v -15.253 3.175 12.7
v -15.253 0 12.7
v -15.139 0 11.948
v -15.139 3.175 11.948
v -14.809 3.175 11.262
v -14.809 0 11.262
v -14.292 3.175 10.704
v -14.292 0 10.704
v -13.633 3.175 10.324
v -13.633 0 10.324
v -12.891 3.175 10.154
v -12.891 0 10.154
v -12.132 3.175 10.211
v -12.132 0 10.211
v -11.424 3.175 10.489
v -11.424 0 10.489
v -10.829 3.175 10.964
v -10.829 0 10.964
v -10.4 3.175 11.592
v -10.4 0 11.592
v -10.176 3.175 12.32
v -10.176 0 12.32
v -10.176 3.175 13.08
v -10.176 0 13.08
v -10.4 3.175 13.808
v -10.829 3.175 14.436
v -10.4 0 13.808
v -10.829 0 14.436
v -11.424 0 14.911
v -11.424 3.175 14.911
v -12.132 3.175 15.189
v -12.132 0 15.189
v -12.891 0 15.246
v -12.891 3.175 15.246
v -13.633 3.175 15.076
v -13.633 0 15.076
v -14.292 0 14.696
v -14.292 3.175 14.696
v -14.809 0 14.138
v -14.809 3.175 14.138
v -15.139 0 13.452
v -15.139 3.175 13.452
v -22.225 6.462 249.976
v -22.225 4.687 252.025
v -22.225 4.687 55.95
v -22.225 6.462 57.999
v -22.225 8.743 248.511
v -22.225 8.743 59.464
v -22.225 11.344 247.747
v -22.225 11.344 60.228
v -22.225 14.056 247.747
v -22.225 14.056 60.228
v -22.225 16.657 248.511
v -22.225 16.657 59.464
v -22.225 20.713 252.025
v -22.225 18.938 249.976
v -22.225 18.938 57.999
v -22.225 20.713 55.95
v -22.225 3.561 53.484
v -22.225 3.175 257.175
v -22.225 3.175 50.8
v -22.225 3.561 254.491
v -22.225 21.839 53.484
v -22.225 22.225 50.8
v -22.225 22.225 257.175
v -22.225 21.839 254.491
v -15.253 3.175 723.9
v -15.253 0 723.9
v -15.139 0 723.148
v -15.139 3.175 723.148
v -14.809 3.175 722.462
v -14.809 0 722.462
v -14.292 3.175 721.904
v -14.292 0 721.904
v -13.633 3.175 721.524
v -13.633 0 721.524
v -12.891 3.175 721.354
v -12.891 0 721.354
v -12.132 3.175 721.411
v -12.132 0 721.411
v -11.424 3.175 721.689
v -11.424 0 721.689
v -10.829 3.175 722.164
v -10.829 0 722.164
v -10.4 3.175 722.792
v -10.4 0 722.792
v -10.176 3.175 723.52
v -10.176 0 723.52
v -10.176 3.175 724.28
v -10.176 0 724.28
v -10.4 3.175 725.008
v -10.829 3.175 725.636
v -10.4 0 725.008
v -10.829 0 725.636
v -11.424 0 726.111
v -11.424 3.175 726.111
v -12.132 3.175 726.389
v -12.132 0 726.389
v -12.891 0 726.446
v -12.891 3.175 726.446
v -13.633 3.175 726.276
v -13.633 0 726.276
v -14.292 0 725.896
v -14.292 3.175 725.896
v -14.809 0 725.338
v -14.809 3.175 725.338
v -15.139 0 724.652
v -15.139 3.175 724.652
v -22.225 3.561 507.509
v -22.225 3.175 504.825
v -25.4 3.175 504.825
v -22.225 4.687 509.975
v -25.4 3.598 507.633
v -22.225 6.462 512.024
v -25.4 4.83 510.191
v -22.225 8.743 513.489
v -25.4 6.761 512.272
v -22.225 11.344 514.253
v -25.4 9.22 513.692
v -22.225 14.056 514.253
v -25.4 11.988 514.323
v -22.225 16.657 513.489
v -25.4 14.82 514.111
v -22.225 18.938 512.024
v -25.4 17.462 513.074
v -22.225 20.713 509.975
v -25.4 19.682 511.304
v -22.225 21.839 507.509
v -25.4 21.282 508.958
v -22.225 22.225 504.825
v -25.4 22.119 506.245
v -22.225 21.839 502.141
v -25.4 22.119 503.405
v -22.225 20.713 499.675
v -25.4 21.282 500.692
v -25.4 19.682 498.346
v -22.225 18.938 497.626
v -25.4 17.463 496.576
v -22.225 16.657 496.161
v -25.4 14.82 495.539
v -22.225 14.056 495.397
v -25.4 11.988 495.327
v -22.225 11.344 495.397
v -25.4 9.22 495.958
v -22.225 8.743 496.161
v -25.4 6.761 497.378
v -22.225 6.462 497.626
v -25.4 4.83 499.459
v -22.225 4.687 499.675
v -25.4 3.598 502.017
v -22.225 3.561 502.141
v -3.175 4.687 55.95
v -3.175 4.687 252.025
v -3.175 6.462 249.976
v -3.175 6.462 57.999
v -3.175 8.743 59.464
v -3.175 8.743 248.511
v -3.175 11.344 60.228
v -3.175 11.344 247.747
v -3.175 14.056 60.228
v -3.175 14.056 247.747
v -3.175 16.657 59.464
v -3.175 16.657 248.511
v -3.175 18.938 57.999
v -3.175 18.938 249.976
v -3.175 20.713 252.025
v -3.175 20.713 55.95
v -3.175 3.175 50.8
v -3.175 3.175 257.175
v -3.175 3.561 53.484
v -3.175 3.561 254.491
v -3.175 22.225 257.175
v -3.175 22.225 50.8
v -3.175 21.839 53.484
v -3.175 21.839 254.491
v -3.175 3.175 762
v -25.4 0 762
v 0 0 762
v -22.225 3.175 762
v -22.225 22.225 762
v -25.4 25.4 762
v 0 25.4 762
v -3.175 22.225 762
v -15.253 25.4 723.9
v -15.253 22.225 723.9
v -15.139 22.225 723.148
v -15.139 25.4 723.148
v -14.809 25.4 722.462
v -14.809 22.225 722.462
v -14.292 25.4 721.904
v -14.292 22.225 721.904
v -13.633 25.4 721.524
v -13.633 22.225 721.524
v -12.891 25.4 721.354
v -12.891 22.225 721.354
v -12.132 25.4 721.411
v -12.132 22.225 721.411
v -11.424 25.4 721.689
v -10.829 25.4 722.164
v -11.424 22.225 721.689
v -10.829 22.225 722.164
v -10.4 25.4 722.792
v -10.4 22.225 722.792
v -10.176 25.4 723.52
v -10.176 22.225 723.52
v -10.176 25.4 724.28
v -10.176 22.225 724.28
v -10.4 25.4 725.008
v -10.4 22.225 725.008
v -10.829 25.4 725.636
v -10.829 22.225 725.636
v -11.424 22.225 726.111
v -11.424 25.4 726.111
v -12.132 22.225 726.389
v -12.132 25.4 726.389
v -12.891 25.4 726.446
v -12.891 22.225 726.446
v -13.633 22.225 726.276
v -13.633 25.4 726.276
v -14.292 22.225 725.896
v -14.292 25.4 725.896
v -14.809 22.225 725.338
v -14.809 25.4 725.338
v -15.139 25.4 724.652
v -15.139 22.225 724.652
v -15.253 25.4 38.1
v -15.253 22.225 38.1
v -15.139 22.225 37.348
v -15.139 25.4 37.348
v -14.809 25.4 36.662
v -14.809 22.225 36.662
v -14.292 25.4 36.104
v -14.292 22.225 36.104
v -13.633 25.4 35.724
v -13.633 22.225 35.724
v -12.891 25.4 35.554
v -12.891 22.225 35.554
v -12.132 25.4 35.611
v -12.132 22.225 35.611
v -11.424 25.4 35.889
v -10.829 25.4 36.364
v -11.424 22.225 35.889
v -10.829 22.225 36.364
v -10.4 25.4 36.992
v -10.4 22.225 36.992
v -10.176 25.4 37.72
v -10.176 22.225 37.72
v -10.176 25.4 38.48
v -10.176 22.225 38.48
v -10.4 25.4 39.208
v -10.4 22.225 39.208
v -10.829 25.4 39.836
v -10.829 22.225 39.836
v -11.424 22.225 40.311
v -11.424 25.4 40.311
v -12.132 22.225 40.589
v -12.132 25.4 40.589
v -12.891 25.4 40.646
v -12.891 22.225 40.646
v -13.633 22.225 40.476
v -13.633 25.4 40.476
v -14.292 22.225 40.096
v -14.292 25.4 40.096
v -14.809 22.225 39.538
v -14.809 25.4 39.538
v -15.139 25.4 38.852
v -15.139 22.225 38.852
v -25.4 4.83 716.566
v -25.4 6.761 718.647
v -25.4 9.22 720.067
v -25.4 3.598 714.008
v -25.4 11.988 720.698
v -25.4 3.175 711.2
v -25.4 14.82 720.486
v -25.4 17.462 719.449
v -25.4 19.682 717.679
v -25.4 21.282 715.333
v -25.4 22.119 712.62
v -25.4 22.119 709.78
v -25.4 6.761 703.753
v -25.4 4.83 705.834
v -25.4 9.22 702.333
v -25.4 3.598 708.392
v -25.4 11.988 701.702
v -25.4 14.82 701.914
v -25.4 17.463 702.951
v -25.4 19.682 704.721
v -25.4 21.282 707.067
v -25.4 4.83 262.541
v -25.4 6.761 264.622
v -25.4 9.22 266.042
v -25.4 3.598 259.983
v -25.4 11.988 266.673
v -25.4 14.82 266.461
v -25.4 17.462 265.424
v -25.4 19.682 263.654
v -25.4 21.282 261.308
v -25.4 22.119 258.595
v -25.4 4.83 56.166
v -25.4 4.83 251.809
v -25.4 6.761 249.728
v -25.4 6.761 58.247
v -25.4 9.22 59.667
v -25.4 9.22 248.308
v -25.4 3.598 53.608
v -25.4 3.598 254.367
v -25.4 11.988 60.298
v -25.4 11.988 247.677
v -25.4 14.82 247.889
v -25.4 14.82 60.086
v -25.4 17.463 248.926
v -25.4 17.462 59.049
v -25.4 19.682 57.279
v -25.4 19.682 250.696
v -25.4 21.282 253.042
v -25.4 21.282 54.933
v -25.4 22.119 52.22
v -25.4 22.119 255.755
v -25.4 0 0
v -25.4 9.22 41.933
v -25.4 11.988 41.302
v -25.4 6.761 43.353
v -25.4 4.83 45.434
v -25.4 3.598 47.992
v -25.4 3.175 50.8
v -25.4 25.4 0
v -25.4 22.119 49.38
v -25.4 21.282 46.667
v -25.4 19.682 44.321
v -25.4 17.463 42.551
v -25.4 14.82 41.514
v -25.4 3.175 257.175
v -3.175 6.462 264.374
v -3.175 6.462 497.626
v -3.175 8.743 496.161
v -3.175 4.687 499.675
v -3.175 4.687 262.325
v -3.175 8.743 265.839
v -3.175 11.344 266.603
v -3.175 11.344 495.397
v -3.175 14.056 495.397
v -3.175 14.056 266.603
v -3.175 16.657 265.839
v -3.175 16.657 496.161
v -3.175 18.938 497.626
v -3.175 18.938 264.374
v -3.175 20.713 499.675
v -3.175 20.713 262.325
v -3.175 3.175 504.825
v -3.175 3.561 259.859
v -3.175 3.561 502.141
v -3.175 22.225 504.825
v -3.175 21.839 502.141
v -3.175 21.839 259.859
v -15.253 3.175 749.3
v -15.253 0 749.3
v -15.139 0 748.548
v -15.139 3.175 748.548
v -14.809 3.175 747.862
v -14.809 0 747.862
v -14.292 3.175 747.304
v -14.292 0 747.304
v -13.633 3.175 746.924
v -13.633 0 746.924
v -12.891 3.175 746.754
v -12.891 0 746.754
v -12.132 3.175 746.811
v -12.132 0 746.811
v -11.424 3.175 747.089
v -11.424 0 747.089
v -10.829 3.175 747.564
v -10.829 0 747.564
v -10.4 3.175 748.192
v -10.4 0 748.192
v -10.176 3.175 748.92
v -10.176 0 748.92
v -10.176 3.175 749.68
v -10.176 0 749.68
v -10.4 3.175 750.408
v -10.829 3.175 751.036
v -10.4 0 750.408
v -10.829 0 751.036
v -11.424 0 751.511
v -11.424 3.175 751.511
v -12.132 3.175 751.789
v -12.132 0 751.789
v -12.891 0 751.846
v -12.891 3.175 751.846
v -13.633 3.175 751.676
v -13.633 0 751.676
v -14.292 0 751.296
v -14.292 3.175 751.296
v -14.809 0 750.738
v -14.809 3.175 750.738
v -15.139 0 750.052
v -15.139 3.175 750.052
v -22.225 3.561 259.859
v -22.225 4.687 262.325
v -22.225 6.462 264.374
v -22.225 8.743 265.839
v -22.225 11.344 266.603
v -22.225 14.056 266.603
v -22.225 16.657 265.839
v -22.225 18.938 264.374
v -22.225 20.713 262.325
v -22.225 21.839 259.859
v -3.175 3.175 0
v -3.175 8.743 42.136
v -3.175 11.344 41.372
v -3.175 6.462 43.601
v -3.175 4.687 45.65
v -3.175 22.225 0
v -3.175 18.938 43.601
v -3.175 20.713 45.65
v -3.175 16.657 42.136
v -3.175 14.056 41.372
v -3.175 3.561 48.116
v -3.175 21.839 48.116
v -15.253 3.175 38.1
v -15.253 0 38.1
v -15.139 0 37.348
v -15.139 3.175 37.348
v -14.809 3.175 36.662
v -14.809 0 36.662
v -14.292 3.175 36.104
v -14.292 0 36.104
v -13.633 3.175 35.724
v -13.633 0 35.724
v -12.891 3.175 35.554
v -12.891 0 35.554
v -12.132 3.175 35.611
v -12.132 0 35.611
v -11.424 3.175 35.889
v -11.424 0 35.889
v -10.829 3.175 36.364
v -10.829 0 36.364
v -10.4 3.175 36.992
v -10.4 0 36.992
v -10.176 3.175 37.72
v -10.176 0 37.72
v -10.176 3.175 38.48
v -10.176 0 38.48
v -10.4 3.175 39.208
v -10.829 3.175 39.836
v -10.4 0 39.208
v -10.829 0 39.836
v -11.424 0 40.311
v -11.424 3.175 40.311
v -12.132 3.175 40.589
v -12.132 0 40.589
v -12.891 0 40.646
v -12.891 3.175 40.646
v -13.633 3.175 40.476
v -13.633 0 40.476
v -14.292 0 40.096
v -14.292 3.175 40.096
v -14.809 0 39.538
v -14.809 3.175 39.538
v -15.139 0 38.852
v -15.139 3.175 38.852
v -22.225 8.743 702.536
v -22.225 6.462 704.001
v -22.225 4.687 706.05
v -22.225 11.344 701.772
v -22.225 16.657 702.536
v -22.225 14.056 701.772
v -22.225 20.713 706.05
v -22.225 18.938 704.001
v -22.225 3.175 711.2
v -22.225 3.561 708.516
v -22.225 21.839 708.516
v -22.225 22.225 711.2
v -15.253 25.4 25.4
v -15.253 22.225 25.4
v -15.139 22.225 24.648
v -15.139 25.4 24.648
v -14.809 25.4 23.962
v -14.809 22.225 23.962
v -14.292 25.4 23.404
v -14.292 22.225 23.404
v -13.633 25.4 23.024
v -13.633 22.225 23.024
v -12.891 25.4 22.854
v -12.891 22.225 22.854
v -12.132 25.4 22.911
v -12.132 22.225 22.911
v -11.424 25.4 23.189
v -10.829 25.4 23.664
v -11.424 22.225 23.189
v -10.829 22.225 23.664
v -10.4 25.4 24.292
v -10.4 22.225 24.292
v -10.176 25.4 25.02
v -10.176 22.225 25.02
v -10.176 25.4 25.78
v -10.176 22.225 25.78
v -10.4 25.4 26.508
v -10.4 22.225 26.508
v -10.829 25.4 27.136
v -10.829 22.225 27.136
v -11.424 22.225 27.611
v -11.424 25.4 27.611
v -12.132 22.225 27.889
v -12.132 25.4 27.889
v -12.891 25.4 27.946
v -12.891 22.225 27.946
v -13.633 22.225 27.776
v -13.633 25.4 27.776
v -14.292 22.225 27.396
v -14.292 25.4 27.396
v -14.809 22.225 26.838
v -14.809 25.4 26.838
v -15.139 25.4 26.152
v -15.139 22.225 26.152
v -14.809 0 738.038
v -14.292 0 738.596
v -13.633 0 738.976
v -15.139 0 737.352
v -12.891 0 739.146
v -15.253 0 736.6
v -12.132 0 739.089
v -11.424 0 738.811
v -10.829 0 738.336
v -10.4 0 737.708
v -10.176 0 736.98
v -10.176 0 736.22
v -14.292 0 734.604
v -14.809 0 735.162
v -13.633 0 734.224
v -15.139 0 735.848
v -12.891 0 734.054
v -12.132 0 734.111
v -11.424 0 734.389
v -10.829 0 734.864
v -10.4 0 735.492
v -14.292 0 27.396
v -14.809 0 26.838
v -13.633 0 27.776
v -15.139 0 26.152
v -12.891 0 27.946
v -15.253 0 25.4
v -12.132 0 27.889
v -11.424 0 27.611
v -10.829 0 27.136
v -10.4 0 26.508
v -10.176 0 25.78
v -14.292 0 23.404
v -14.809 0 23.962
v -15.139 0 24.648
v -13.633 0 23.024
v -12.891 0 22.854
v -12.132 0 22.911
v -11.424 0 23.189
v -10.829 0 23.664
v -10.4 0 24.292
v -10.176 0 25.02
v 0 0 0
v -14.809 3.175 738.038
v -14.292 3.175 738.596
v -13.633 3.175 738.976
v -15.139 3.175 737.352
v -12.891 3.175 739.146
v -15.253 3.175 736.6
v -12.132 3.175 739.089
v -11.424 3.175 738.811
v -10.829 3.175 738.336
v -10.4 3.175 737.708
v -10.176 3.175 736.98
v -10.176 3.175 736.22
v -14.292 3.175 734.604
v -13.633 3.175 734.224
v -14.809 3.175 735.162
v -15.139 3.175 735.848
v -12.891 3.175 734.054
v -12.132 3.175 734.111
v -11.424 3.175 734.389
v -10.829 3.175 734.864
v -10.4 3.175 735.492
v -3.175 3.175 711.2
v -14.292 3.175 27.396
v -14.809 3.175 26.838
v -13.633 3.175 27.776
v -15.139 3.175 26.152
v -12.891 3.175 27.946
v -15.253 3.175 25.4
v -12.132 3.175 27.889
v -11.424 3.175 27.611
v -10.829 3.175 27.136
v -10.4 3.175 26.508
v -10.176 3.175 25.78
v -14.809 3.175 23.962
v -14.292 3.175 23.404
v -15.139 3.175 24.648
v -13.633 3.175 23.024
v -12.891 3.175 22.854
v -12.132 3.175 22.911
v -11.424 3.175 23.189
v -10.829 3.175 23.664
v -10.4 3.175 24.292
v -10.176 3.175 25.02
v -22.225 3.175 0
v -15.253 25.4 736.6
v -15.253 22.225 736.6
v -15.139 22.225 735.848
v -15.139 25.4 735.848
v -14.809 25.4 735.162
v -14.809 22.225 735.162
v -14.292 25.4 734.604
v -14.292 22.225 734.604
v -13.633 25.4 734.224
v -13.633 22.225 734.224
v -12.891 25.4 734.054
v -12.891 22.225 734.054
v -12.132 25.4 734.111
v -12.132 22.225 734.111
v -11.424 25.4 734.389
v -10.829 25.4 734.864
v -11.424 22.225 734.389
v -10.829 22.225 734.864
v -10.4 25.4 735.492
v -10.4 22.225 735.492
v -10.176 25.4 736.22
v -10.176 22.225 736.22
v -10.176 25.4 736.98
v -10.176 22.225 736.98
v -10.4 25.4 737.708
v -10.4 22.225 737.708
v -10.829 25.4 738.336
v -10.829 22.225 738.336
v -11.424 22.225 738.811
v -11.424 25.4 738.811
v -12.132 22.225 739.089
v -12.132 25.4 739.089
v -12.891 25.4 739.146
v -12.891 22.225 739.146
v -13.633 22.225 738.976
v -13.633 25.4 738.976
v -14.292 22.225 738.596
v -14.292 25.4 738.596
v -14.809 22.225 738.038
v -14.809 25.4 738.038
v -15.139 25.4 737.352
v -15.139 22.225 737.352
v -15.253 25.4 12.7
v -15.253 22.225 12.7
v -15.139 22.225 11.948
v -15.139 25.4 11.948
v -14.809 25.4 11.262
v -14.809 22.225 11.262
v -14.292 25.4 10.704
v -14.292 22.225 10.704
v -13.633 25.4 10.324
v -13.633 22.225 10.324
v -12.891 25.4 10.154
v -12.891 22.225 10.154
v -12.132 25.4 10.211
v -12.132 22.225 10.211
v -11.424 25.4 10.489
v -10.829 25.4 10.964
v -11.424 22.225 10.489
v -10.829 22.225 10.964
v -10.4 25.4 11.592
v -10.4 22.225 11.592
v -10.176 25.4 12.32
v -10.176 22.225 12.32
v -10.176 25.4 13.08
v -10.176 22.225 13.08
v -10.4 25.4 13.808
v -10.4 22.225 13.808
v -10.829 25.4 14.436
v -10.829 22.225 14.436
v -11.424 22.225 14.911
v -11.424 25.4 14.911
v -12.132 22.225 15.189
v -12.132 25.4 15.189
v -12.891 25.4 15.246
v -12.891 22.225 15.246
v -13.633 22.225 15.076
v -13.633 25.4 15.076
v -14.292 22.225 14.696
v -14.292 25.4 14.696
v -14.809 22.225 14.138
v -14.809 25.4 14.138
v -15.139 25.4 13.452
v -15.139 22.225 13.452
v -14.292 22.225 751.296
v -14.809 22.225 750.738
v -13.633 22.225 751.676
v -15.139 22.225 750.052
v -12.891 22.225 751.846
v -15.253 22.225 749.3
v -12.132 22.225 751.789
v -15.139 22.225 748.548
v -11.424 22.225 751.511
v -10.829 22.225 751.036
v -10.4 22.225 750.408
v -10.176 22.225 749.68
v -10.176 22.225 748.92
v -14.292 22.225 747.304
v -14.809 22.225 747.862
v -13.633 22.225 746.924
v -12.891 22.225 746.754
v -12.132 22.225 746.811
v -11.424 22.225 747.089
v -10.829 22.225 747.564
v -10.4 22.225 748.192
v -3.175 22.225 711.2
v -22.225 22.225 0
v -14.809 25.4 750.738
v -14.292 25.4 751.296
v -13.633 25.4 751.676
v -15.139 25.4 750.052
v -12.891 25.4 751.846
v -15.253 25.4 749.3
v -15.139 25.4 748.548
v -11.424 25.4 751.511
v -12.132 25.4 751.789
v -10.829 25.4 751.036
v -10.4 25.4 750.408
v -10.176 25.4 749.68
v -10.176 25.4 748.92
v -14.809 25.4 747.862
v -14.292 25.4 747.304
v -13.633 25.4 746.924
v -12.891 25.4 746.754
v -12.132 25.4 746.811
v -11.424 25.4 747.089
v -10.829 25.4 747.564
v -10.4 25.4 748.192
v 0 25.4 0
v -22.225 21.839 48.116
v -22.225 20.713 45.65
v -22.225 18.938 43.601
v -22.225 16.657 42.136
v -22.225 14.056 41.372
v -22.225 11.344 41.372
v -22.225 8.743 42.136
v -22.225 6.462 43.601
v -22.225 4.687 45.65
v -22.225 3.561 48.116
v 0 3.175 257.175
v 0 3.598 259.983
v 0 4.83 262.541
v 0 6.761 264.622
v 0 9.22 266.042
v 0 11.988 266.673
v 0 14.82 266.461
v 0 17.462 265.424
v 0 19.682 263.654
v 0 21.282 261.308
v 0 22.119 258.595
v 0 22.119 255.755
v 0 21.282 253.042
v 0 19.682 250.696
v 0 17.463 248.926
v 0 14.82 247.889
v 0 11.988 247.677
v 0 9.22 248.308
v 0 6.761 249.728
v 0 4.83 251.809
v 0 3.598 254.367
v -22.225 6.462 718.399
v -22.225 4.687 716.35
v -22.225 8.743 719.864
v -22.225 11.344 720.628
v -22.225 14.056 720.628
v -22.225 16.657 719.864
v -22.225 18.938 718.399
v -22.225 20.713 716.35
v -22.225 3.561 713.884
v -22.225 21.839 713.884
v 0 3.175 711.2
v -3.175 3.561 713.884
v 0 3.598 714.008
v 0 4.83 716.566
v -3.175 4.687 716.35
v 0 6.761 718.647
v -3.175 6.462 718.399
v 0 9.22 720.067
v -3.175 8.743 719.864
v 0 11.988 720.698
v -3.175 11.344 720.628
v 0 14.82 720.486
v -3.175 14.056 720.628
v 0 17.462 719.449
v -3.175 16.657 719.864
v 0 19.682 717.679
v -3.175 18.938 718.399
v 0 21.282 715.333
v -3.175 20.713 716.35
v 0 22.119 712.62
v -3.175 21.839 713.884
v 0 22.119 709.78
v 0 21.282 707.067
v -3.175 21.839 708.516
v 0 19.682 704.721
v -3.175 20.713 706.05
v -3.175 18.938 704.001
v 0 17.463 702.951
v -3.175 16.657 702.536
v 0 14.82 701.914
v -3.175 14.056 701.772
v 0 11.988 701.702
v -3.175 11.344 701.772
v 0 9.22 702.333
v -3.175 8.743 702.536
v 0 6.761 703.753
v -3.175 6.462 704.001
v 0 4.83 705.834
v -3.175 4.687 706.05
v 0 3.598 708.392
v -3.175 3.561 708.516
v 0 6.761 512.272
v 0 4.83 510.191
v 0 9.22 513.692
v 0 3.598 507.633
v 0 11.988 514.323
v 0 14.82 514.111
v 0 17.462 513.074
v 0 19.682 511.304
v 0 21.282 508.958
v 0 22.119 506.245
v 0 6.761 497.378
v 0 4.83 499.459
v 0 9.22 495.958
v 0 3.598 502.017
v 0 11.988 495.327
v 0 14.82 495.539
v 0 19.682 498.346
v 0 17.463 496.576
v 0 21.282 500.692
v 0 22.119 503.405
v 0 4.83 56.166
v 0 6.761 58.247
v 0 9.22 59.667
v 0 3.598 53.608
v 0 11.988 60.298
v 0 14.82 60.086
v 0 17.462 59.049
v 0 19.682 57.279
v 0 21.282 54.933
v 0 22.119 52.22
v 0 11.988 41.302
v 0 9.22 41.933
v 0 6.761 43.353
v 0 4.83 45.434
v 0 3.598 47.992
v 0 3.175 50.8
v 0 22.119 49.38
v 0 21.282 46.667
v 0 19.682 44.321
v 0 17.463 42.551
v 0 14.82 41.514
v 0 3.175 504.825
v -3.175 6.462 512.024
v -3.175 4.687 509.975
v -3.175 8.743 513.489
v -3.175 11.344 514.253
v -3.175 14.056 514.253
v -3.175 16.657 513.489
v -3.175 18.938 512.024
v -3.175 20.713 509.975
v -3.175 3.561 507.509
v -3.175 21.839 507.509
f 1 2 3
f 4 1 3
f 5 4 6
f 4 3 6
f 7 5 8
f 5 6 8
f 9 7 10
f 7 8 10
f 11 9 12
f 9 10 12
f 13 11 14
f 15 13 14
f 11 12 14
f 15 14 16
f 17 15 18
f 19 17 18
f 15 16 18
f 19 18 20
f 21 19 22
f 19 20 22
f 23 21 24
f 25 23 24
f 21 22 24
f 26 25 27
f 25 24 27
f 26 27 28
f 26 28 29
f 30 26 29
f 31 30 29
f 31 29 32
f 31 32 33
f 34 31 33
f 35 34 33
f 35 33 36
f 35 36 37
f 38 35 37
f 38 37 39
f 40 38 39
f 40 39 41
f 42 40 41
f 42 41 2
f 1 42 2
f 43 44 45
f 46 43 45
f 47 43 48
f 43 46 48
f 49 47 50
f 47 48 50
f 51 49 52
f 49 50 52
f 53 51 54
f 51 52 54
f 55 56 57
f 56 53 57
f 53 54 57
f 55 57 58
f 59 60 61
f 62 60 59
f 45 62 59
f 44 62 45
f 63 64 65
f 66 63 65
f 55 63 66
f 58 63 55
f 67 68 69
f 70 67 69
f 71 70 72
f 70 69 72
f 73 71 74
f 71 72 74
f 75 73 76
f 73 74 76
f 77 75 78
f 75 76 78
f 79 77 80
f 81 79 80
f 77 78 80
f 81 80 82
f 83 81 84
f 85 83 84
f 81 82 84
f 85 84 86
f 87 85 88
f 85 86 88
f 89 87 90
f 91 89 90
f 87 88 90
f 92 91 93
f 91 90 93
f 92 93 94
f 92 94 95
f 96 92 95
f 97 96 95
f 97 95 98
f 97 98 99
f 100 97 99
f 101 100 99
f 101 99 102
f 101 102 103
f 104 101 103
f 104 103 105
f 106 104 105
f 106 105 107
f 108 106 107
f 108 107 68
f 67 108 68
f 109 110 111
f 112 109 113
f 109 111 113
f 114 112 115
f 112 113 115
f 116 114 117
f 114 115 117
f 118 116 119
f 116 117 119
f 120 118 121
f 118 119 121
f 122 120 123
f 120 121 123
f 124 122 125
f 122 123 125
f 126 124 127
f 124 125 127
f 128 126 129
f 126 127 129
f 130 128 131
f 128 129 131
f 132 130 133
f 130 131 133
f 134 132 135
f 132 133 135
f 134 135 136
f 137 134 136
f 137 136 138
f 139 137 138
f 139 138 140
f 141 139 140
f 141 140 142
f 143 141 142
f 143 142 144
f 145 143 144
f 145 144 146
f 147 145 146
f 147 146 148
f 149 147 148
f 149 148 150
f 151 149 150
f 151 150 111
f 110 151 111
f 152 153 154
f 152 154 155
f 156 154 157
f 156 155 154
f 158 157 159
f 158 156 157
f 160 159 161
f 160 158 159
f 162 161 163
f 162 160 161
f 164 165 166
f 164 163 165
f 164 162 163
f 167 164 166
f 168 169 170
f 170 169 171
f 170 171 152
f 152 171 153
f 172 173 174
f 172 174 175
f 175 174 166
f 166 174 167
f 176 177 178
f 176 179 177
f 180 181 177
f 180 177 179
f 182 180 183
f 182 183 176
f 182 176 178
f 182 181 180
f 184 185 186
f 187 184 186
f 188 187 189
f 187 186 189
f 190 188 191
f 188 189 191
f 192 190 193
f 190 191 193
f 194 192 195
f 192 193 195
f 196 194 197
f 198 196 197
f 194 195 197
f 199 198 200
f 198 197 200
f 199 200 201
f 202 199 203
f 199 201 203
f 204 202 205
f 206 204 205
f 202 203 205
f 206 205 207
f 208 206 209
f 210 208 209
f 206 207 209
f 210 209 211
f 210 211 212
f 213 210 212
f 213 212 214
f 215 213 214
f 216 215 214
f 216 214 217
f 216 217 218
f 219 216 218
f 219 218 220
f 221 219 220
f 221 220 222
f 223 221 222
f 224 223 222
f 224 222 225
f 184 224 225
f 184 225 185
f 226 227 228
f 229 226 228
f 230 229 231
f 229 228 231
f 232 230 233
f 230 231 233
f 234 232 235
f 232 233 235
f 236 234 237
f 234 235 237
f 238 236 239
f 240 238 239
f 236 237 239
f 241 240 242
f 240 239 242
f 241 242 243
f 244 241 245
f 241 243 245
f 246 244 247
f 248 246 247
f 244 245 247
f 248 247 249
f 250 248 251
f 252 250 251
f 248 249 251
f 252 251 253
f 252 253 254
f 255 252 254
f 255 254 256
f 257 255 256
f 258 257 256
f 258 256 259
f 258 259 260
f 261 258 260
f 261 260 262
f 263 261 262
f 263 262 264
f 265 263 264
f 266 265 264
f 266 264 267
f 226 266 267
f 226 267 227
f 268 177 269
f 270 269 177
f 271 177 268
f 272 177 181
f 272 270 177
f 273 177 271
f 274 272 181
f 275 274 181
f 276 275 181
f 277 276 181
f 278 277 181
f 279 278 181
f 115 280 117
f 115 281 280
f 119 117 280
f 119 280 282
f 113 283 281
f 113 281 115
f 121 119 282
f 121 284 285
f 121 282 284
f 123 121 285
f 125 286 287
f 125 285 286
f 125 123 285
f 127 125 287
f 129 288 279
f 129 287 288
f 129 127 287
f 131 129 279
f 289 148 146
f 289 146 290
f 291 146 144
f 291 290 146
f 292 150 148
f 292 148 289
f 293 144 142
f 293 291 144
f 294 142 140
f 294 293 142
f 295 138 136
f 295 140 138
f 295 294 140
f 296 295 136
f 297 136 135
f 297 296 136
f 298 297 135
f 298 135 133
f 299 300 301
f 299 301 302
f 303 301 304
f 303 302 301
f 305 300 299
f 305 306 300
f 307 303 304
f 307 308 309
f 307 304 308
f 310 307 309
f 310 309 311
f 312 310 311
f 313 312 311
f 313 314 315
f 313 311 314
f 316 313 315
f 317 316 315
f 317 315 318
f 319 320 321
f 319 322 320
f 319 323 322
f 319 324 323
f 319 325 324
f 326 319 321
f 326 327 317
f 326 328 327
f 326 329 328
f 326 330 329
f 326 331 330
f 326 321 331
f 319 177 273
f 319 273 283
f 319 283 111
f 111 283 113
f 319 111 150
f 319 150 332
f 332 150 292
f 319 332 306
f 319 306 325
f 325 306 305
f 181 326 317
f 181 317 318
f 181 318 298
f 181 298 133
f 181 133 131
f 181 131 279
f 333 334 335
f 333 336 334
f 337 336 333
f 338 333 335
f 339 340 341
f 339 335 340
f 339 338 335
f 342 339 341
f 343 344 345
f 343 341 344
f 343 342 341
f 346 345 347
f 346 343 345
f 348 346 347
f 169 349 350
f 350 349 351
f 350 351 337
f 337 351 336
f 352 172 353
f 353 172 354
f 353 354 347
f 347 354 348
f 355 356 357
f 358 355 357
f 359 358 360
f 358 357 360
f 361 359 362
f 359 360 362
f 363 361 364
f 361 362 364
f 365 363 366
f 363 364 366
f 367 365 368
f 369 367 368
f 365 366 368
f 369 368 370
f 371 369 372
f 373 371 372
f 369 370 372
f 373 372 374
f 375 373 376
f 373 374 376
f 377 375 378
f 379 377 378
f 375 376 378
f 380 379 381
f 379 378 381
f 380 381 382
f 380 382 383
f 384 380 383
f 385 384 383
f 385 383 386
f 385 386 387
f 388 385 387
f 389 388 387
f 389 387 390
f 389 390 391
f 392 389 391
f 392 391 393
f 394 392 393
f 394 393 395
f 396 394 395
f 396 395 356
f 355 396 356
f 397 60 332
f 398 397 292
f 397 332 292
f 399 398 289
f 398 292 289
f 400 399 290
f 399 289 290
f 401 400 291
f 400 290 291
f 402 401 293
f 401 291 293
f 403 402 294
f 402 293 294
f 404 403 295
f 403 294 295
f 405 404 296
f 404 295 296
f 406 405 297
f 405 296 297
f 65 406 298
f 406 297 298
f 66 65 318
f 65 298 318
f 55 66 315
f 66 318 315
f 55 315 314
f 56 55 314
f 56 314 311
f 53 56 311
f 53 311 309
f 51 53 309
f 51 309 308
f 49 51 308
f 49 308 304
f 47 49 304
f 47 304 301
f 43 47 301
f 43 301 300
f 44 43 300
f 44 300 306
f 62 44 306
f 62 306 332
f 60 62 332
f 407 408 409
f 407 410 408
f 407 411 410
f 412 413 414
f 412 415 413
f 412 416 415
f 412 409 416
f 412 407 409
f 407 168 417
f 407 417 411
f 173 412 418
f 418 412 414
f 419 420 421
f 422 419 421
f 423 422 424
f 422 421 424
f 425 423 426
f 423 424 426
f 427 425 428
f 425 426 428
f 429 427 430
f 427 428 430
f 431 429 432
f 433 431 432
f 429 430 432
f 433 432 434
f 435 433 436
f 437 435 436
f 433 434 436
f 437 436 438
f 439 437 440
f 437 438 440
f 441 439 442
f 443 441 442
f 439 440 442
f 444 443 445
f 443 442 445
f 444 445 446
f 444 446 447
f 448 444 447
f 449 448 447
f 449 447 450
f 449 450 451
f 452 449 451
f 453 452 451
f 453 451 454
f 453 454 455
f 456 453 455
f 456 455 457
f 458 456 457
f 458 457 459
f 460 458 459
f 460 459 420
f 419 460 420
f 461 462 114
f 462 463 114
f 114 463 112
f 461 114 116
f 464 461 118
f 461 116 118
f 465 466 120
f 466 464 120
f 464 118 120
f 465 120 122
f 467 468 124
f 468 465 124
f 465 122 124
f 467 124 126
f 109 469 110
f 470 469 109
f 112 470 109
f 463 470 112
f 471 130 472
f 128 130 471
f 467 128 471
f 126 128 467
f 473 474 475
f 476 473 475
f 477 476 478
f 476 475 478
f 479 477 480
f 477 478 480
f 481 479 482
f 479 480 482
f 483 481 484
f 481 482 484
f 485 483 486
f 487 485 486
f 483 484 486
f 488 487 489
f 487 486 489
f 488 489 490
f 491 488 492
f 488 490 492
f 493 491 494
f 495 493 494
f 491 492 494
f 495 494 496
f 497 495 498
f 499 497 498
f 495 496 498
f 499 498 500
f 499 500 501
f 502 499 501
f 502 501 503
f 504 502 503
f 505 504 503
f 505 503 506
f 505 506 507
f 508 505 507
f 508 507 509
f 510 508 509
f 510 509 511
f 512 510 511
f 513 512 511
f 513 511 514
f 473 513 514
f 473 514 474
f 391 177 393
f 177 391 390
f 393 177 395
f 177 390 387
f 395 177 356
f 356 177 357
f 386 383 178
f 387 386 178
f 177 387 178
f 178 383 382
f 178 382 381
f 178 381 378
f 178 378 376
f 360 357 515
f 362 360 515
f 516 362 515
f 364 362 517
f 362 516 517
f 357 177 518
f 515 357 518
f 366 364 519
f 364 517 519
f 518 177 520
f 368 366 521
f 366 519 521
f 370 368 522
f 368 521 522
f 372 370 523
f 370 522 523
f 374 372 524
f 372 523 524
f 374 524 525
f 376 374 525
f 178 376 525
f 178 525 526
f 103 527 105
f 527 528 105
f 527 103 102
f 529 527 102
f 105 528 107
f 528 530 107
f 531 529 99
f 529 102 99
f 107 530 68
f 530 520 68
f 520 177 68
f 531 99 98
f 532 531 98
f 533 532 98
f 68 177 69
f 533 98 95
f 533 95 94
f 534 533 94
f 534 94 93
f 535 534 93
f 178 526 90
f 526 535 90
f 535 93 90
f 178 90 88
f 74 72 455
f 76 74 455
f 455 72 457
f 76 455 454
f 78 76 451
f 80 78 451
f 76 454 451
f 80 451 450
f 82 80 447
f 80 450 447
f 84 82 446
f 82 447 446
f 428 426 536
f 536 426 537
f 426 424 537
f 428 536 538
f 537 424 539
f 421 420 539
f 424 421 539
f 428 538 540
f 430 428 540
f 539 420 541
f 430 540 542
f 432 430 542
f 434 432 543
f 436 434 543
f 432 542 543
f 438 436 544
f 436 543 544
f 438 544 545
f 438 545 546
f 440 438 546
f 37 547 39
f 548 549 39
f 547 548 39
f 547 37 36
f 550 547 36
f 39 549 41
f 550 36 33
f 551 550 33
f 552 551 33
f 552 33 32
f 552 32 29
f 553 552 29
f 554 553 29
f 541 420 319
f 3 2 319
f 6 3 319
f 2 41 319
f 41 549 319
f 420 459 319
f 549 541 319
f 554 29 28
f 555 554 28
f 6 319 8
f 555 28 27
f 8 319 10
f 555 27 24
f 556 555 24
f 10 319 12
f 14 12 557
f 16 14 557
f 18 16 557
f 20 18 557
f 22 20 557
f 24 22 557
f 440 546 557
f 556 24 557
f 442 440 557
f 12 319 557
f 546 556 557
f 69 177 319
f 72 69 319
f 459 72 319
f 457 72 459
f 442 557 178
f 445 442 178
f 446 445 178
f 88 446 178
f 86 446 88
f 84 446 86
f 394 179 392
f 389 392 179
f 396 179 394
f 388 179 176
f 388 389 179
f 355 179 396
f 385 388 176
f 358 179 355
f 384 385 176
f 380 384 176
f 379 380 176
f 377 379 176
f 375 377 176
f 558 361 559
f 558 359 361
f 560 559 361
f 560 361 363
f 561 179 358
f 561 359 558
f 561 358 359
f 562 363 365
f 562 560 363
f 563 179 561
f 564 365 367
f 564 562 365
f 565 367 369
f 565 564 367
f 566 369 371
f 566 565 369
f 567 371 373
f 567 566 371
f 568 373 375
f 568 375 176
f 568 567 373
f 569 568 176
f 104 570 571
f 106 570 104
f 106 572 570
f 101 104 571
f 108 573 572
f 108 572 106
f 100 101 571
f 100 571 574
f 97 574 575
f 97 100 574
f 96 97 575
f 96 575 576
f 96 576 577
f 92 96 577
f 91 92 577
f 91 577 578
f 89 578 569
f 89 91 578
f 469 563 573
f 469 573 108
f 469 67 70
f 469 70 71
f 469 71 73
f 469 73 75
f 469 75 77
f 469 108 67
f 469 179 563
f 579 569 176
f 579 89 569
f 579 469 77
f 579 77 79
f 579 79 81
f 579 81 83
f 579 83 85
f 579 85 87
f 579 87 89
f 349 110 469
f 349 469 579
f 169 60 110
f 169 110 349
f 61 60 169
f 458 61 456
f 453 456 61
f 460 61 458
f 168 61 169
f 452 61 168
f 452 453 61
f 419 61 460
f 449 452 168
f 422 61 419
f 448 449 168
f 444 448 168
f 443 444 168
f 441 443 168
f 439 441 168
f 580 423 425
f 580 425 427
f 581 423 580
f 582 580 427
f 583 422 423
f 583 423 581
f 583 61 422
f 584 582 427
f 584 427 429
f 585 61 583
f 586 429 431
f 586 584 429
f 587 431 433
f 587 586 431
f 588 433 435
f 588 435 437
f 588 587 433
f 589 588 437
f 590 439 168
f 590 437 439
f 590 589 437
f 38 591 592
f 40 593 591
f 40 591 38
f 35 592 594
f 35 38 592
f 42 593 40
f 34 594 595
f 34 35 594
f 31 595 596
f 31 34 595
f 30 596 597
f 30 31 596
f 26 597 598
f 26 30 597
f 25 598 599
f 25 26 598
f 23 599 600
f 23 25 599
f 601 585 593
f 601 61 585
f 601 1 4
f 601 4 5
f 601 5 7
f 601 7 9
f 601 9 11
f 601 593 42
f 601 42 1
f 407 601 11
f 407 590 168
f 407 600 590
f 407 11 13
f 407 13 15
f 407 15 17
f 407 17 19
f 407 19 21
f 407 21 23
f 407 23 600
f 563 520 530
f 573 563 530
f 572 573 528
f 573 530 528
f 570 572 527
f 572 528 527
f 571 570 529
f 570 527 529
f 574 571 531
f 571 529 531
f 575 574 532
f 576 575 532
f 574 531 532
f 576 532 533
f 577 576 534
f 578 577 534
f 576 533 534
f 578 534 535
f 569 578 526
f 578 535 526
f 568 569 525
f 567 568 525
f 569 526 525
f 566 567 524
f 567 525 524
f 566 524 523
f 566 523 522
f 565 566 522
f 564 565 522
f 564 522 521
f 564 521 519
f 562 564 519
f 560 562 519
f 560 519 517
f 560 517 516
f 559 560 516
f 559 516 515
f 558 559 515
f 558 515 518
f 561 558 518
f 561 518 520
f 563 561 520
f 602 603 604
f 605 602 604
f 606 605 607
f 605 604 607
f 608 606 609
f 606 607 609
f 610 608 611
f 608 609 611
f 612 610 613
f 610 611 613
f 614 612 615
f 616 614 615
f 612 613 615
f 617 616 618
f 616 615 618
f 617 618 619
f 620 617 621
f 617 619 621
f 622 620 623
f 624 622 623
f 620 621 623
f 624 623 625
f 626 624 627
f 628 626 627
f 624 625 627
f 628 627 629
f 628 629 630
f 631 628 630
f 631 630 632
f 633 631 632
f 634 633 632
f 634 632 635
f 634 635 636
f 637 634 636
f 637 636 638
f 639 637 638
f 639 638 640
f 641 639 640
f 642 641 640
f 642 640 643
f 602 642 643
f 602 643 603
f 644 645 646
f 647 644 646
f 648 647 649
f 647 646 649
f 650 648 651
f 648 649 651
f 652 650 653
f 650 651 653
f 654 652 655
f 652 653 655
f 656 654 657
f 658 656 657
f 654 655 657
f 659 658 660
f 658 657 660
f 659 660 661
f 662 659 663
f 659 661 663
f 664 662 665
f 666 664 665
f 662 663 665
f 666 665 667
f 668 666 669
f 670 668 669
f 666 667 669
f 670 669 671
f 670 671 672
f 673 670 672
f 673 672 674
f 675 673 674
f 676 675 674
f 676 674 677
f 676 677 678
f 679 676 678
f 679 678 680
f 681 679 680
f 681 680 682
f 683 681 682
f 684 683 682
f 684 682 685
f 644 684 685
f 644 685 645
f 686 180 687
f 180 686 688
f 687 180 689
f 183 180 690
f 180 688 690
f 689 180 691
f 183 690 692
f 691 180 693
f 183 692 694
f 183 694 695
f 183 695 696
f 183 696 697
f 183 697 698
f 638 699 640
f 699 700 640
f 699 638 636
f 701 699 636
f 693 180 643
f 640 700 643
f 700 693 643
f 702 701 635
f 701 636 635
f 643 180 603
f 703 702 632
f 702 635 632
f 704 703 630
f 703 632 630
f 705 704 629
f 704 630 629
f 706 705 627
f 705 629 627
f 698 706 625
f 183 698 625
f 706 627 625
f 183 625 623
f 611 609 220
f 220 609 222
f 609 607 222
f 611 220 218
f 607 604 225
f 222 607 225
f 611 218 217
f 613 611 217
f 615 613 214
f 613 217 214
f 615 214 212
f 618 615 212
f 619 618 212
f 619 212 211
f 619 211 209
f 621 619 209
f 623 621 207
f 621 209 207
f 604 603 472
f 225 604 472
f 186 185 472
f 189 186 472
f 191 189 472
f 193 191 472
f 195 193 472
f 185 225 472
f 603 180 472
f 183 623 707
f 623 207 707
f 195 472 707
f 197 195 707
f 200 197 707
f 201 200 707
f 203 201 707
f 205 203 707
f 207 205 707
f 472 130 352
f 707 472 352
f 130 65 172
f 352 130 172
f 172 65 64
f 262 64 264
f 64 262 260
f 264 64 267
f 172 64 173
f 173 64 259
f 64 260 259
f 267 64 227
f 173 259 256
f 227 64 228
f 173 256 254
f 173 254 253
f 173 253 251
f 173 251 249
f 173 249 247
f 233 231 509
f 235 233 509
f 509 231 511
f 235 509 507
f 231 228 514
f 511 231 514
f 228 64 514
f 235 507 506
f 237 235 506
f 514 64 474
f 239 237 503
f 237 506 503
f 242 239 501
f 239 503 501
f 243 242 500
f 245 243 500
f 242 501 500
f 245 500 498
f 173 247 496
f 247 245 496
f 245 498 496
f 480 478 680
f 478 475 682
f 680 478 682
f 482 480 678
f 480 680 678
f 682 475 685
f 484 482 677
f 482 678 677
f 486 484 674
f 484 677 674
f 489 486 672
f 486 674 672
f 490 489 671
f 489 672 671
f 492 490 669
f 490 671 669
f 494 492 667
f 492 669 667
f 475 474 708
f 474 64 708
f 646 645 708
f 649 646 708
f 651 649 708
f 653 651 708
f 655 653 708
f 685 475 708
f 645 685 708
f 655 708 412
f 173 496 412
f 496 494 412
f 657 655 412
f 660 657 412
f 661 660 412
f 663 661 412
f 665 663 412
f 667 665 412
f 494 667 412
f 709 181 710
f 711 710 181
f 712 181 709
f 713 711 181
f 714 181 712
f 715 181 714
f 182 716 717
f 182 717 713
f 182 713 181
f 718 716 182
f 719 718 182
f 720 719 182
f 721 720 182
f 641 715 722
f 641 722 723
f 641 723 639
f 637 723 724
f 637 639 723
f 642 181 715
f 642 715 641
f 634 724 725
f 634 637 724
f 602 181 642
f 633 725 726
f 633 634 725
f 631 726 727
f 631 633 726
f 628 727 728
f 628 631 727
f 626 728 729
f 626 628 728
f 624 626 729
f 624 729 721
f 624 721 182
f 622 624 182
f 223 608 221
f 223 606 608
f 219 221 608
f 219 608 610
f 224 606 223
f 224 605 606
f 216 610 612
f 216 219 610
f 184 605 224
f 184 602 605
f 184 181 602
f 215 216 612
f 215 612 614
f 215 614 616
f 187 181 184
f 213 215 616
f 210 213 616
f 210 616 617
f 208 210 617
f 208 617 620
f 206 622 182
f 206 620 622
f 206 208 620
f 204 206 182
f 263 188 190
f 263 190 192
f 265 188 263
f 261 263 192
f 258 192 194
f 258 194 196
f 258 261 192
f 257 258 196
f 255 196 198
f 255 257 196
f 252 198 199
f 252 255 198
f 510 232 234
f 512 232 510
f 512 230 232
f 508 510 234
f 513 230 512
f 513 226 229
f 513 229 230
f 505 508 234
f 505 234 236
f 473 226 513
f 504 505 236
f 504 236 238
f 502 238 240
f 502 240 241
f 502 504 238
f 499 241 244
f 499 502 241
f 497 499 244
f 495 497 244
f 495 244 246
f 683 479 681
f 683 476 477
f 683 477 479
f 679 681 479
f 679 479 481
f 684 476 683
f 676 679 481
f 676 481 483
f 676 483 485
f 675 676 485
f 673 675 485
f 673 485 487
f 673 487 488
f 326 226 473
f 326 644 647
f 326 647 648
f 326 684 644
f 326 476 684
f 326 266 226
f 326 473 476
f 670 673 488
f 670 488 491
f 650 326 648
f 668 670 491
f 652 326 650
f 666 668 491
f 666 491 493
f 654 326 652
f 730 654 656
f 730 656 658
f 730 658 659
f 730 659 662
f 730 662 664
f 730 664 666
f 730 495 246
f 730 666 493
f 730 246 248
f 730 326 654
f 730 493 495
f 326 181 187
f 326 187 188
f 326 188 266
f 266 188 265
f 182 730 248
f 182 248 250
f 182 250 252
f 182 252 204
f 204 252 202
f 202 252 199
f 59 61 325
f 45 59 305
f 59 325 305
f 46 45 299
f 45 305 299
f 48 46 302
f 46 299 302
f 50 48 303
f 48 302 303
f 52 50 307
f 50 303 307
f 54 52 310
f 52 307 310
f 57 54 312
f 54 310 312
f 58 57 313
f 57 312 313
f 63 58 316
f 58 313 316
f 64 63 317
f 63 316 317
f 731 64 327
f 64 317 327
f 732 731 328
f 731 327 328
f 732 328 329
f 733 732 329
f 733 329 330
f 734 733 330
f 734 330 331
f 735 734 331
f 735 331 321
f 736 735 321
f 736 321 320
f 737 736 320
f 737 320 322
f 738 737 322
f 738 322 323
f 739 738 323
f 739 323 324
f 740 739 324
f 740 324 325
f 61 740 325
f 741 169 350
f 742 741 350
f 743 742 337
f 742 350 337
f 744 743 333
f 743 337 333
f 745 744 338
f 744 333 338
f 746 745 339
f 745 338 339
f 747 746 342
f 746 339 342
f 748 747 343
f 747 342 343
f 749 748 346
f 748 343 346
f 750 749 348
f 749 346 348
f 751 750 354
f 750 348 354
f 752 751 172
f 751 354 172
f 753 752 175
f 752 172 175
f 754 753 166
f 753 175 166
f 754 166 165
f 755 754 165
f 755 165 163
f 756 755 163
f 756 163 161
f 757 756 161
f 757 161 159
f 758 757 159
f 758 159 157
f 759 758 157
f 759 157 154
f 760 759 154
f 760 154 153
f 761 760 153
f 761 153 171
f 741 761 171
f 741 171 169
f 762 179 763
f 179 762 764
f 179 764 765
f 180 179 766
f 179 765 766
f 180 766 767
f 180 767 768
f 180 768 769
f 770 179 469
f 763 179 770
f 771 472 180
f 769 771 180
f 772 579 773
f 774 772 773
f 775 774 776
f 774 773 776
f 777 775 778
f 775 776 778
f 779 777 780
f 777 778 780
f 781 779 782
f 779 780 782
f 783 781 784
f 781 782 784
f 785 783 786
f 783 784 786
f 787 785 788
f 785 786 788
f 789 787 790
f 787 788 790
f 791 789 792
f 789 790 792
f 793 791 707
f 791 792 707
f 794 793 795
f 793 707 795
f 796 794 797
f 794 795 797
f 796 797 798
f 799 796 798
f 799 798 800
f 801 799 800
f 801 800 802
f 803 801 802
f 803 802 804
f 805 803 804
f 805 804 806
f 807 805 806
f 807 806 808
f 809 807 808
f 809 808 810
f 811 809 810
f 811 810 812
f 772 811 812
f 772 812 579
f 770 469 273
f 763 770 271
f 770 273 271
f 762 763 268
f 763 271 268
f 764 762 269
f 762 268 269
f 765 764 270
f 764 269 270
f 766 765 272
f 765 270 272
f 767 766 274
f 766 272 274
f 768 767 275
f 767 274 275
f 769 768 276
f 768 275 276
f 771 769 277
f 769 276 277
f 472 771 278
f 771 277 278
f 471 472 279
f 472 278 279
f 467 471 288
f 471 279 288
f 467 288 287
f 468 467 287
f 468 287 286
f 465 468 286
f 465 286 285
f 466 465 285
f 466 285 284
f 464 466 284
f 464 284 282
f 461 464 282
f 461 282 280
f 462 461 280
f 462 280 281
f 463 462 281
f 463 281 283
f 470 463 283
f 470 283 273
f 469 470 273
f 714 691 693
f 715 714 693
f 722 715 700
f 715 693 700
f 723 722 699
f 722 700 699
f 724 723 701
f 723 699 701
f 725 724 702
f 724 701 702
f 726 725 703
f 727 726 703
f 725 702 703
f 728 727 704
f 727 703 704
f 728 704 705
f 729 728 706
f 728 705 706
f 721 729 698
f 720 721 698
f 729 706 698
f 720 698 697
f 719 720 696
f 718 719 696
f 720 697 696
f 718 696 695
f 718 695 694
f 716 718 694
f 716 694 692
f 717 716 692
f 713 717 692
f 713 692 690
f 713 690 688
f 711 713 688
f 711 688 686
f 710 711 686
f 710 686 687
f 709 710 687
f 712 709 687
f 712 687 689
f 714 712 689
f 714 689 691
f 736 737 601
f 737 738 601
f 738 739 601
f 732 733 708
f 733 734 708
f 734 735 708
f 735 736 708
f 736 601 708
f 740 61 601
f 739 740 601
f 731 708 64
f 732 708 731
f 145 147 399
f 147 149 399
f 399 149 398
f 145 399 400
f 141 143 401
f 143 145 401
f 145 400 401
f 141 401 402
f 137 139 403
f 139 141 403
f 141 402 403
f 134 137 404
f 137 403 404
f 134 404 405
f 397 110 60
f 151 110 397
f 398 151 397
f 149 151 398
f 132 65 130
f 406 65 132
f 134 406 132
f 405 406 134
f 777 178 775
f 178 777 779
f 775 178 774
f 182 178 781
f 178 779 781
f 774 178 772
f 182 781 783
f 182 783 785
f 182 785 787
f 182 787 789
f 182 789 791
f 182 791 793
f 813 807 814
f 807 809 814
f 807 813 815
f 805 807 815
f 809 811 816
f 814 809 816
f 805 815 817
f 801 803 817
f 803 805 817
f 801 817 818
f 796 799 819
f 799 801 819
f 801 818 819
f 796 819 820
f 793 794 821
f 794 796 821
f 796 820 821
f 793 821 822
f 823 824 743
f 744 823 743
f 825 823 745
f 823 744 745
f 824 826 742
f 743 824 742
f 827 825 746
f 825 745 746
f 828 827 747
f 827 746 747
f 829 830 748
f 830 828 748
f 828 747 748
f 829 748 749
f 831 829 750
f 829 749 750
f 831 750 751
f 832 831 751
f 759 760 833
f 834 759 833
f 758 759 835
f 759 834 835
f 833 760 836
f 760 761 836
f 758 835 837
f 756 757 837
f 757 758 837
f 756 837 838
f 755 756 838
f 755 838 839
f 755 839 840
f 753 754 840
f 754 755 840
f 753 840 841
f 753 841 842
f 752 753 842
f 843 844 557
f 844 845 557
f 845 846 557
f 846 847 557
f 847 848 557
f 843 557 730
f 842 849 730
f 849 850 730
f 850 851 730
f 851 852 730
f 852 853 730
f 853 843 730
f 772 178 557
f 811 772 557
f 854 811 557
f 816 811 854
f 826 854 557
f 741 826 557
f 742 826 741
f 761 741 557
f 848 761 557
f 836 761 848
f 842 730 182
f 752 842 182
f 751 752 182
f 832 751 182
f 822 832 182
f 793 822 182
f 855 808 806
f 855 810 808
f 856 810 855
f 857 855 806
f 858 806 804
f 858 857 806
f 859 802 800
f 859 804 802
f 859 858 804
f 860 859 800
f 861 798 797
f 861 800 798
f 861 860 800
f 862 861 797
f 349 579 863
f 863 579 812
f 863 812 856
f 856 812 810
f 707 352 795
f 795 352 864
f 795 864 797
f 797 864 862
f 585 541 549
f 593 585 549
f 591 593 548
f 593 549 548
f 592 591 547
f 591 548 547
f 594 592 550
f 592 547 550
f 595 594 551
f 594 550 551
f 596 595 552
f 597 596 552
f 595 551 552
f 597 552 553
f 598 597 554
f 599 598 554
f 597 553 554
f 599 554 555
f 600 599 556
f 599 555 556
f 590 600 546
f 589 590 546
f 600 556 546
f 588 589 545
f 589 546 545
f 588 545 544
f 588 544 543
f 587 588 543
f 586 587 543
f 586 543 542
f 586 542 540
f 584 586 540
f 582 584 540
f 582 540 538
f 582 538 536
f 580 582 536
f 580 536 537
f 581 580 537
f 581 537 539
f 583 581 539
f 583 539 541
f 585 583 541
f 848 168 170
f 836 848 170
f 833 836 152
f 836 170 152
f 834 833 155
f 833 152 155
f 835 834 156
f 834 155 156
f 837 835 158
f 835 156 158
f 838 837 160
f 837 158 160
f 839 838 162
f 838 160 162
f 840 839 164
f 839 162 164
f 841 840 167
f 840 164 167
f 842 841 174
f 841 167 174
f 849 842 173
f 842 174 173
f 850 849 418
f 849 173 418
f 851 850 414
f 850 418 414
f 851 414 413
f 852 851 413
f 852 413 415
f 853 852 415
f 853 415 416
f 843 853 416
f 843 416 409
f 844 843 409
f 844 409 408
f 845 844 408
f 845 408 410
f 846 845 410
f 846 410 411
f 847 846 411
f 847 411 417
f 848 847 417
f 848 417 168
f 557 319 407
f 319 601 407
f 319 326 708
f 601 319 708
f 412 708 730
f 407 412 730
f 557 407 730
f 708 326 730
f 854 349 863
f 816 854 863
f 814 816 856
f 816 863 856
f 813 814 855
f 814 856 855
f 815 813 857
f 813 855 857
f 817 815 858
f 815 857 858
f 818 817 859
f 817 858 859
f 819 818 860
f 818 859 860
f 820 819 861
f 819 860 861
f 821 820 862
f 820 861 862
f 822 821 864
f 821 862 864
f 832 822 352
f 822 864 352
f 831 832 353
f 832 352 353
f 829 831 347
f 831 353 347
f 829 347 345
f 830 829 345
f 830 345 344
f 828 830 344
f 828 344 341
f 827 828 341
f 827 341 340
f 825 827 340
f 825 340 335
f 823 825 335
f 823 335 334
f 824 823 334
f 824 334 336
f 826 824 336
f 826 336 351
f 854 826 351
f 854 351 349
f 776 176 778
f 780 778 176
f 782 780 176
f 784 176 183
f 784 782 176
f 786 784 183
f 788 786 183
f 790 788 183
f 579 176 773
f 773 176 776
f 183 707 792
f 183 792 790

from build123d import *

# Parameters (mm, degrees)
SKETCH1_W              = 25.4
SKETCH1_H              = 25.4
SKETCH1_W_2            = 19.05
SKETCH1_H_2            = 19.05
BOSS_EXTRUDE1_DEPTH    = 762
F_10_CLEARANCE_HOLE1_D = 5.1054
CUT_EXTRUDE1_REACH     = 764.846
SKETCH5_R              = 9.525


with BuildPart() as part:
    # Sketch1 → Boss-Extrude1 (new body)
    with BuildSketch(Plane.XY):
        with Locations((-12.7, 12.7)):
            Rectangle(SKETCH1_W, SKETCH1_H)
        with Locations((-12.7, 12.7)):
            Rectangle(SKETCH1_W_2, SKETCH1_H_2, mode=Mode.SUBTRACT)
    extrude(amount=BOSS_EXTRUDE1_DEPTH)

    # #10 Clearance Hole1 (through all)
    with Locations(Plane(origin=(0, 25.4, 0), x_dir=(1, 0, 0), z_dir=(0, 1, 0))):
        with Locations((-12.7, -749.3), (-12.7, -736.6), (-12.7, -723.9), (-12.7, -38.1), (-12.7, -25.4), (-12.7, -12.7)):
            Hole(F_10_CLEARANCE_HOLE1_D / 2)

    # Cut-Extrude1: up to this face of the body (flat: up to its plane)
    cut_extrude1_end = Plane(part.part.faces().sort_by_distance((0, 12.7, 381))[0])
    # Sketch5 → Cut-Extrude1 (cut, up to the picked face)
    with BuildSketch(Plane.ZY.offset(25.4), mode=Mode.PRIVATE) as cut_extrude1_sk1:
        with Locations(Location((50.8, 12.7, 0), (0, 0, 270))):
            Circle(SKETCH5_R)
    cut_extrude1_tool1 = split(extrude(cut_extrude1_sk1.sketch, amount=-CUT_EXTRUDE1_REACH, mode=Mode.PRIVATE), bisect_by=cut_extrude1_end, keep=Keep.BOTH, mode=Mode.PRIVATE)
    # Sketch5 → Cut-Extrude1 (cut, up to the picked face)
    with BuildSketch(Plane.ZY.offset(25.4), mode=Mode.PRIVATE) as cut_extrude1_sk2:
        with Locations(Location((711.2, 12.7, 0), (0, 0, 270))):
            Circle(SKETCH5_R)
    cut_extrude1_tool2 = split(extrude(cut_extrude1_sk2.sketch, amount=-CUT_EXTRUDE1_REACH, mode=Mode.PRIVATE), bisect_by=cut_extrude1_end, keep=Keep.BOTH, mode=Mode.PRIVATE)
    # Sketch5 → Cut-Extrude1 (cut, up to the picked face)
    with BuildSketch(Plane.ZY.offset(25.4), mode=Mode.PRIVATE) as cut_extrude1_sk3:
        with Locations(Location((504.825, 12.7, 0), (0, 0, 270))):
            Circle(SKETCH5_R)
    cut_extrude1_tool3 = split(extrude(cut_extrude1_sk3.sketch, amount=-CUT_EXTRUDE1_REACH, mode=Mode.PRIVATE), bisect_by=cut_extrude1_end, keep=Keep.BOTH, mode=Mode.PRIVATE)
    # Sketch5 → Cut-Extrude1 (cut, up to the picked face)
    with BuildSketch(Plane.ZY.offset(25.4), mode=Mode.PRIVATE) as cut_extrude1_sk4:
        with Locations(Location((257.175, 12.7, 0), (0, 0, 270))):
            Circle(SKETCH5_R)
    cut_extrude1_tool4 = split(extrude(cut_extrude1_sk4.sketch, amount=-CUT_EXTRUDE1_REACH, mode=Mode.PRIVATE), bisect_by=cut_extrude1_end, keep=Keep.BOTH, mode=Mode.PRIVATE)
    add(cut_extrude1_tool1.solids().sort_by(Axis((-25.4, 12.7, 50.8), (1, 0, 0)))[0], mode=Mode.SUBTRACT)
    add(cut_extrude1_tool2.solids().sort_by(Axis((-25.4, 12.7, 711.2), (1, 0, 0)))[0], mode=Mode.SUBTRACT)
    add(cut_extrude1_tool3.solids().sort_by(Axis((-25.4, 12.7, 504.825), (1, 0, 0)))[0], mode=Mode.SUBTRACT)
    add(cut_extrude1_tool4.solids().sort_by(Axis((-25.4, 12.7, 257.175), (1, 0, 0)))[0], mode=Mode.SUBTRACT)


solid = part.part
